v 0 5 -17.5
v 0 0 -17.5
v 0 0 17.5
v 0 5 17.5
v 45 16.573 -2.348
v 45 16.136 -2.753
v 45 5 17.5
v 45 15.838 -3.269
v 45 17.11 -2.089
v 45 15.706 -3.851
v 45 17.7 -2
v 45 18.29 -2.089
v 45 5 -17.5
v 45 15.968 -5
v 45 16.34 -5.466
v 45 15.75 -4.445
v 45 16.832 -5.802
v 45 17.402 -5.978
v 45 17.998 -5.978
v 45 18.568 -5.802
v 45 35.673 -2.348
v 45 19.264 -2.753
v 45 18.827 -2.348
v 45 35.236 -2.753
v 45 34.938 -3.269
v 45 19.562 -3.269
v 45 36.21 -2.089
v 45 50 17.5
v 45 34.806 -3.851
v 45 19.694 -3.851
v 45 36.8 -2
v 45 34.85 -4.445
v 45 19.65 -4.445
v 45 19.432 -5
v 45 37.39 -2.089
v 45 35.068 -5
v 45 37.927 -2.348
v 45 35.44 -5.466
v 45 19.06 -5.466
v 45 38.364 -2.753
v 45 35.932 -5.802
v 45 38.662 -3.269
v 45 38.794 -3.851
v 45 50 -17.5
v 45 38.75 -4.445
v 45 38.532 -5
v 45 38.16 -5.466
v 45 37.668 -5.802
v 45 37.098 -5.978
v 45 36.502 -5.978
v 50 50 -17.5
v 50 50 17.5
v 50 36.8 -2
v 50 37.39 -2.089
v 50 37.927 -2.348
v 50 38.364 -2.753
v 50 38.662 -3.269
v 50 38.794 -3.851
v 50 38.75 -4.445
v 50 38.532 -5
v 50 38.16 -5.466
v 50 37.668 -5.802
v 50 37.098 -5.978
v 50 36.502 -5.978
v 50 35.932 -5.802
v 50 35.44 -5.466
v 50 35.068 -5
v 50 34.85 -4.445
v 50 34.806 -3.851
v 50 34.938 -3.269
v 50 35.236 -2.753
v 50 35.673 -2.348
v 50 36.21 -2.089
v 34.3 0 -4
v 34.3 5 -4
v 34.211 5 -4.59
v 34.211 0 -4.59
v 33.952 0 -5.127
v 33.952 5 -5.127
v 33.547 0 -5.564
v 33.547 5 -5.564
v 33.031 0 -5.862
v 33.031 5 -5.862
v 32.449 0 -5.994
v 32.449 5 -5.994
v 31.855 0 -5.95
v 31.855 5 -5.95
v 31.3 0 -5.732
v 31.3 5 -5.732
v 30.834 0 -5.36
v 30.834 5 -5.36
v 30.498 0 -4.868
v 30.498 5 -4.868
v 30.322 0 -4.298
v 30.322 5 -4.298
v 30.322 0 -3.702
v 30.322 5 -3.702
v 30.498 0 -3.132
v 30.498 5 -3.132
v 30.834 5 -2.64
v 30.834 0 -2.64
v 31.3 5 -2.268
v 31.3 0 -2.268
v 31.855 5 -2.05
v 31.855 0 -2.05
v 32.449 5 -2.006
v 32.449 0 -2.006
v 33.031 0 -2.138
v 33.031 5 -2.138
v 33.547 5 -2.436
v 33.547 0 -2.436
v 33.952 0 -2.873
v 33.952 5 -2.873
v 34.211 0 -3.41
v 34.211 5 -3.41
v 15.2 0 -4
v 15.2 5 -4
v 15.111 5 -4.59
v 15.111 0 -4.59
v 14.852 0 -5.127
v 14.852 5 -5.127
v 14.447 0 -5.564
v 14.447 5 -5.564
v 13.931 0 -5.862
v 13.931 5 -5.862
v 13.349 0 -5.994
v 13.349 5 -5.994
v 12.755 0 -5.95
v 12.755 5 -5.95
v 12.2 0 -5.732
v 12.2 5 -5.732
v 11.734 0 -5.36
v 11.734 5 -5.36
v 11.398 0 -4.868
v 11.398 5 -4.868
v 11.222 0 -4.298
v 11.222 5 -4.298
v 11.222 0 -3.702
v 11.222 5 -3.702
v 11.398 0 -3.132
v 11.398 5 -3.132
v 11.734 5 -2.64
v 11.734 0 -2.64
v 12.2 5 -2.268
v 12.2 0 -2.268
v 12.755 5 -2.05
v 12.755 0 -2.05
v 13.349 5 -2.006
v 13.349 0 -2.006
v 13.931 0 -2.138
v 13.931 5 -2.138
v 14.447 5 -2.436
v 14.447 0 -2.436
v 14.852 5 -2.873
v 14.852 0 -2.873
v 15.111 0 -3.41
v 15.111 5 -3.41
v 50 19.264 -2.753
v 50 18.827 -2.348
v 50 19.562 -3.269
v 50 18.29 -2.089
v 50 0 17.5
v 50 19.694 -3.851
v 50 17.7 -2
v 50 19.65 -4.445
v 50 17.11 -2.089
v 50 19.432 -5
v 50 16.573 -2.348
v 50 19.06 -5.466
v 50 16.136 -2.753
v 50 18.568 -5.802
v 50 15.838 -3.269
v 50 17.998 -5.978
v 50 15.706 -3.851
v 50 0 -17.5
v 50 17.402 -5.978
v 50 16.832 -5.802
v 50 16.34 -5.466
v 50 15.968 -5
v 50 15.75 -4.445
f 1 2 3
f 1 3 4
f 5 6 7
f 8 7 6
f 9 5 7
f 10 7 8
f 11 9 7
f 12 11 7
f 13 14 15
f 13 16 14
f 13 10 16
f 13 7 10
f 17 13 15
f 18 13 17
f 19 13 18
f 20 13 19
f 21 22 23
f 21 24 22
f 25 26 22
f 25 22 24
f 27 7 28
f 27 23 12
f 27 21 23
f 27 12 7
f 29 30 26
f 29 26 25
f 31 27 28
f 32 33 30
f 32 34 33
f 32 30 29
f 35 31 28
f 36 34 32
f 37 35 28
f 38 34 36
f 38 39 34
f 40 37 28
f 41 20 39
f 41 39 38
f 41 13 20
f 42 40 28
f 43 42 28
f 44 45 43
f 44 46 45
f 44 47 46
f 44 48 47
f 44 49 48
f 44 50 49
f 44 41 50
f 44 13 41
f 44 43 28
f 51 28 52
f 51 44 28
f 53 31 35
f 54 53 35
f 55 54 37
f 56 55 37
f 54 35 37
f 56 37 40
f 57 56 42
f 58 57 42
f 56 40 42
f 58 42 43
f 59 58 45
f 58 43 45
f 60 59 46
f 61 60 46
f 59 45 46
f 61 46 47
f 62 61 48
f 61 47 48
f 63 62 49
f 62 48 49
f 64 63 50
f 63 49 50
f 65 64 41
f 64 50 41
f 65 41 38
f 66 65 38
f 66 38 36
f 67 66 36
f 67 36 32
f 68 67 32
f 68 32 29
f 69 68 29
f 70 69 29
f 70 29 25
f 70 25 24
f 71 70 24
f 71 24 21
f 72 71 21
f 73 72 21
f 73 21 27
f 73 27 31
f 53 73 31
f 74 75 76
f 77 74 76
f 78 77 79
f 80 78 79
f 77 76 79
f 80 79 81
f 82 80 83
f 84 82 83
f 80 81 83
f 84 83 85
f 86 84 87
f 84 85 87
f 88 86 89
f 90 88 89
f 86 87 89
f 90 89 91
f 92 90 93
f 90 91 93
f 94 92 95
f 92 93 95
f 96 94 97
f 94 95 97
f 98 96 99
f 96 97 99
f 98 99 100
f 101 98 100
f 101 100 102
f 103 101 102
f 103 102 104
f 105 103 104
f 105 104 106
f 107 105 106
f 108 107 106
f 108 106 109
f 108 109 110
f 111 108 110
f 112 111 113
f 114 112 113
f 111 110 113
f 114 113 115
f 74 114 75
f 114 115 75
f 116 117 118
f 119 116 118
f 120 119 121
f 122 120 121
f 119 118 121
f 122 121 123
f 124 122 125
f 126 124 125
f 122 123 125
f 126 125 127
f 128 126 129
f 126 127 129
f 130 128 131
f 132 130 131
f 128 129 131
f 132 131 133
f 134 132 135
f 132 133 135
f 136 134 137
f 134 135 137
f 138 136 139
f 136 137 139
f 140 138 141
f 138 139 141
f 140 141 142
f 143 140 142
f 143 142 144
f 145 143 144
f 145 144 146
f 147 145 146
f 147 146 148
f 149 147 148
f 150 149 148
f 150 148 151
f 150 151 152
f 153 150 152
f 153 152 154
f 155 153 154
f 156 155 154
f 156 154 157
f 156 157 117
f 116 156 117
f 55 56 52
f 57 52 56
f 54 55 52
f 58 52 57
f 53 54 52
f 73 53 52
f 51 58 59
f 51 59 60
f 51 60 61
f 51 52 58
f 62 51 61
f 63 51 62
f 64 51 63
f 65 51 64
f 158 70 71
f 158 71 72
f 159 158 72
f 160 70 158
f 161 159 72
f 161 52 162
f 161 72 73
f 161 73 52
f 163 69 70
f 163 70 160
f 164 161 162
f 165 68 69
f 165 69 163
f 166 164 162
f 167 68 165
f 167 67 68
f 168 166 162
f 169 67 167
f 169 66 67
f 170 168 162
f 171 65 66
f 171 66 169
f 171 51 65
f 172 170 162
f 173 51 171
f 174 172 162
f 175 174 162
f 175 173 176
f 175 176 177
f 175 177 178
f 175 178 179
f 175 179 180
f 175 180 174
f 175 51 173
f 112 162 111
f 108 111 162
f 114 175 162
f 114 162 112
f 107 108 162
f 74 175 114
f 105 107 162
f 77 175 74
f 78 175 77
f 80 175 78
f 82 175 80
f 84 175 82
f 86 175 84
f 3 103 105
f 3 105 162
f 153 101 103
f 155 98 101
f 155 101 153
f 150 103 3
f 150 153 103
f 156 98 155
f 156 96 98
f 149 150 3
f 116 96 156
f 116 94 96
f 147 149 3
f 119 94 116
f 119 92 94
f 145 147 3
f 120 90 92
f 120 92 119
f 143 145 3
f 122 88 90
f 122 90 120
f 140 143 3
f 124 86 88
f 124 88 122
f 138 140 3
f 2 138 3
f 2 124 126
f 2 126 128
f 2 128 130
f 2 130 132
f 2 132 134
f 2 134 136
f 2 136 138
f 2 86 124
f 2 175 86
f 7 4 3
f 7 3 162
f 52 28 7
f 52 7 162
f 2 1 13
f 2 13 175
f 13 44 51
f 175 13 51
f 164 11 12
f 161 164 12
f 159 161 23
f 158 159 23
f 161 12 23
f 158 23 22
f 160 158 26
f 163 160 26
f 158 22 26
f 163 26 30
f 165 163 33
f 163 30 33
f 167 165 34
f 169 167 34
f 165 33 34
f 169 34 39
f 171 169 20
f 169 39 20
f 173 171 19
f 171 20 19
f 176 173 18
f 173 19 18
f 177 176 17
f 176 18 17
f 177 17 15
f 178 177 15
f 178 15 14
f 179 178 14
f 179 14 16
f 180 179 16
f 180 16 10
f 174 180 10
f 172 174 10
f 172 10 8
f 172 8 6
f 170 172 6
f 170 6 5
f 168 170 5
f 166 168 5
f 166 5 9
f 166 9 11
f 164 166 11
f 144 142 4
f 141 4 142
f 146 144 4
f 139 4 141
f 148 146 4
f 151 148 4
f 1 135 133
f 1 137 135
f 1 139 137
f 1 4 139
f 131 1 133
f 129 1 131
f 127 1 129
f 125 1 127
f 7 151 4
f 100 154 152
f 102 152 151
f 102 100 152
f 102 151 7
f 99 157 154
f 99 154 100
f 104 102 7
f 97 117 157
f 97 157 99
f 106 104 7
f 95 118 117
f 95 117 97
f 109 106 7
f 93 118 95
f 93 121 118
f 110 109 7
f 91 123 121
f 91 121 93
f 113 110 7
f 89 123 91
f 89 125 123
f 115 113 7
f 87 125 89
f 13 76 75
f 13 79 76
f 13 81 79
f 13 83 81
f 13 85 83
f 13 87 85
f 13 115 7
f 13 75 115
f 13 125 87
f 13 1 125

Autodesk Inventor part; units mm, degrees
ref_plane "YZ Plane" through (0, 0, 0) normal (1, 0, 0) x (0, 1, 0)
ref_plane "XZ Plane" through (0, 0, 0) normal (0, 1, 0) x (-1, 0, 0)
ref_plane "XY Plane" through (0, 0, 0) normal (0, 0, 1) x (1, 0, 0)
sketch "Sketch1" plane through (0, 0, 0) normal (0, 0, 1) x (1, 0, 0)
  line L0 (0, 5) -> (45, 5)
  line L1 (45, 5) -> (45, 50)
  line L2 (45, 50) -> (50, 50)
  line L3 (50, 50) -> (50, 0)
  line L4 (50, 0) -> (0, 0)
  line L5 (0, 0) -> (0, 5)
  dimension "d0" = 50
  dimension "d1" = 50
  dimension "d2" = 5
  dimension "d3" = 5
extrude "Extrusion1" add sketch "Sketch1" along normal mid plane 35
sketch "Sketch2" plane through (0, 5, 17.5) normal (0, 1, 0) x (1, 0, 0)
  line L0 (45, 35) -> (0, 35) projected
  line L1 (0, 35) -> (0, 0) projected
  circle A0 centre (13.2, 21.5) radius 2
  circle A1 centre (32.3, 21.5) radius 2
  point P0 (0, 17.5)
  dimension "d6" = 4
  dimension "d7" = 13.2
  dimension "d8" = 19.1
  dimension "d9" = 13.5
extrude "Extrusion2" cut sketch "Sketch2" against normal through all
sketch "Sketch3" plane through (45, 5, 17.5) normal (-1, 0, 0) x (0, 0, 1)
  line L0 (0, 45) -> (-35, 45) projected
  line L1 (-35, 45) -> (-35, 0) projected
  circle A0 centre (-21.5, 31.8) radius 2
  circle A1 centre (-21.5, 12.7) radius 2
  point P0 (-17.5, -5)
  dimension "d12" = 13.2
  dimension "d13" = 19.1
  dimension "d14" = 13.5
  dimension "d15" = 4
extrude "Extrusion3" cut sketch "Sketch3" against normal through all
